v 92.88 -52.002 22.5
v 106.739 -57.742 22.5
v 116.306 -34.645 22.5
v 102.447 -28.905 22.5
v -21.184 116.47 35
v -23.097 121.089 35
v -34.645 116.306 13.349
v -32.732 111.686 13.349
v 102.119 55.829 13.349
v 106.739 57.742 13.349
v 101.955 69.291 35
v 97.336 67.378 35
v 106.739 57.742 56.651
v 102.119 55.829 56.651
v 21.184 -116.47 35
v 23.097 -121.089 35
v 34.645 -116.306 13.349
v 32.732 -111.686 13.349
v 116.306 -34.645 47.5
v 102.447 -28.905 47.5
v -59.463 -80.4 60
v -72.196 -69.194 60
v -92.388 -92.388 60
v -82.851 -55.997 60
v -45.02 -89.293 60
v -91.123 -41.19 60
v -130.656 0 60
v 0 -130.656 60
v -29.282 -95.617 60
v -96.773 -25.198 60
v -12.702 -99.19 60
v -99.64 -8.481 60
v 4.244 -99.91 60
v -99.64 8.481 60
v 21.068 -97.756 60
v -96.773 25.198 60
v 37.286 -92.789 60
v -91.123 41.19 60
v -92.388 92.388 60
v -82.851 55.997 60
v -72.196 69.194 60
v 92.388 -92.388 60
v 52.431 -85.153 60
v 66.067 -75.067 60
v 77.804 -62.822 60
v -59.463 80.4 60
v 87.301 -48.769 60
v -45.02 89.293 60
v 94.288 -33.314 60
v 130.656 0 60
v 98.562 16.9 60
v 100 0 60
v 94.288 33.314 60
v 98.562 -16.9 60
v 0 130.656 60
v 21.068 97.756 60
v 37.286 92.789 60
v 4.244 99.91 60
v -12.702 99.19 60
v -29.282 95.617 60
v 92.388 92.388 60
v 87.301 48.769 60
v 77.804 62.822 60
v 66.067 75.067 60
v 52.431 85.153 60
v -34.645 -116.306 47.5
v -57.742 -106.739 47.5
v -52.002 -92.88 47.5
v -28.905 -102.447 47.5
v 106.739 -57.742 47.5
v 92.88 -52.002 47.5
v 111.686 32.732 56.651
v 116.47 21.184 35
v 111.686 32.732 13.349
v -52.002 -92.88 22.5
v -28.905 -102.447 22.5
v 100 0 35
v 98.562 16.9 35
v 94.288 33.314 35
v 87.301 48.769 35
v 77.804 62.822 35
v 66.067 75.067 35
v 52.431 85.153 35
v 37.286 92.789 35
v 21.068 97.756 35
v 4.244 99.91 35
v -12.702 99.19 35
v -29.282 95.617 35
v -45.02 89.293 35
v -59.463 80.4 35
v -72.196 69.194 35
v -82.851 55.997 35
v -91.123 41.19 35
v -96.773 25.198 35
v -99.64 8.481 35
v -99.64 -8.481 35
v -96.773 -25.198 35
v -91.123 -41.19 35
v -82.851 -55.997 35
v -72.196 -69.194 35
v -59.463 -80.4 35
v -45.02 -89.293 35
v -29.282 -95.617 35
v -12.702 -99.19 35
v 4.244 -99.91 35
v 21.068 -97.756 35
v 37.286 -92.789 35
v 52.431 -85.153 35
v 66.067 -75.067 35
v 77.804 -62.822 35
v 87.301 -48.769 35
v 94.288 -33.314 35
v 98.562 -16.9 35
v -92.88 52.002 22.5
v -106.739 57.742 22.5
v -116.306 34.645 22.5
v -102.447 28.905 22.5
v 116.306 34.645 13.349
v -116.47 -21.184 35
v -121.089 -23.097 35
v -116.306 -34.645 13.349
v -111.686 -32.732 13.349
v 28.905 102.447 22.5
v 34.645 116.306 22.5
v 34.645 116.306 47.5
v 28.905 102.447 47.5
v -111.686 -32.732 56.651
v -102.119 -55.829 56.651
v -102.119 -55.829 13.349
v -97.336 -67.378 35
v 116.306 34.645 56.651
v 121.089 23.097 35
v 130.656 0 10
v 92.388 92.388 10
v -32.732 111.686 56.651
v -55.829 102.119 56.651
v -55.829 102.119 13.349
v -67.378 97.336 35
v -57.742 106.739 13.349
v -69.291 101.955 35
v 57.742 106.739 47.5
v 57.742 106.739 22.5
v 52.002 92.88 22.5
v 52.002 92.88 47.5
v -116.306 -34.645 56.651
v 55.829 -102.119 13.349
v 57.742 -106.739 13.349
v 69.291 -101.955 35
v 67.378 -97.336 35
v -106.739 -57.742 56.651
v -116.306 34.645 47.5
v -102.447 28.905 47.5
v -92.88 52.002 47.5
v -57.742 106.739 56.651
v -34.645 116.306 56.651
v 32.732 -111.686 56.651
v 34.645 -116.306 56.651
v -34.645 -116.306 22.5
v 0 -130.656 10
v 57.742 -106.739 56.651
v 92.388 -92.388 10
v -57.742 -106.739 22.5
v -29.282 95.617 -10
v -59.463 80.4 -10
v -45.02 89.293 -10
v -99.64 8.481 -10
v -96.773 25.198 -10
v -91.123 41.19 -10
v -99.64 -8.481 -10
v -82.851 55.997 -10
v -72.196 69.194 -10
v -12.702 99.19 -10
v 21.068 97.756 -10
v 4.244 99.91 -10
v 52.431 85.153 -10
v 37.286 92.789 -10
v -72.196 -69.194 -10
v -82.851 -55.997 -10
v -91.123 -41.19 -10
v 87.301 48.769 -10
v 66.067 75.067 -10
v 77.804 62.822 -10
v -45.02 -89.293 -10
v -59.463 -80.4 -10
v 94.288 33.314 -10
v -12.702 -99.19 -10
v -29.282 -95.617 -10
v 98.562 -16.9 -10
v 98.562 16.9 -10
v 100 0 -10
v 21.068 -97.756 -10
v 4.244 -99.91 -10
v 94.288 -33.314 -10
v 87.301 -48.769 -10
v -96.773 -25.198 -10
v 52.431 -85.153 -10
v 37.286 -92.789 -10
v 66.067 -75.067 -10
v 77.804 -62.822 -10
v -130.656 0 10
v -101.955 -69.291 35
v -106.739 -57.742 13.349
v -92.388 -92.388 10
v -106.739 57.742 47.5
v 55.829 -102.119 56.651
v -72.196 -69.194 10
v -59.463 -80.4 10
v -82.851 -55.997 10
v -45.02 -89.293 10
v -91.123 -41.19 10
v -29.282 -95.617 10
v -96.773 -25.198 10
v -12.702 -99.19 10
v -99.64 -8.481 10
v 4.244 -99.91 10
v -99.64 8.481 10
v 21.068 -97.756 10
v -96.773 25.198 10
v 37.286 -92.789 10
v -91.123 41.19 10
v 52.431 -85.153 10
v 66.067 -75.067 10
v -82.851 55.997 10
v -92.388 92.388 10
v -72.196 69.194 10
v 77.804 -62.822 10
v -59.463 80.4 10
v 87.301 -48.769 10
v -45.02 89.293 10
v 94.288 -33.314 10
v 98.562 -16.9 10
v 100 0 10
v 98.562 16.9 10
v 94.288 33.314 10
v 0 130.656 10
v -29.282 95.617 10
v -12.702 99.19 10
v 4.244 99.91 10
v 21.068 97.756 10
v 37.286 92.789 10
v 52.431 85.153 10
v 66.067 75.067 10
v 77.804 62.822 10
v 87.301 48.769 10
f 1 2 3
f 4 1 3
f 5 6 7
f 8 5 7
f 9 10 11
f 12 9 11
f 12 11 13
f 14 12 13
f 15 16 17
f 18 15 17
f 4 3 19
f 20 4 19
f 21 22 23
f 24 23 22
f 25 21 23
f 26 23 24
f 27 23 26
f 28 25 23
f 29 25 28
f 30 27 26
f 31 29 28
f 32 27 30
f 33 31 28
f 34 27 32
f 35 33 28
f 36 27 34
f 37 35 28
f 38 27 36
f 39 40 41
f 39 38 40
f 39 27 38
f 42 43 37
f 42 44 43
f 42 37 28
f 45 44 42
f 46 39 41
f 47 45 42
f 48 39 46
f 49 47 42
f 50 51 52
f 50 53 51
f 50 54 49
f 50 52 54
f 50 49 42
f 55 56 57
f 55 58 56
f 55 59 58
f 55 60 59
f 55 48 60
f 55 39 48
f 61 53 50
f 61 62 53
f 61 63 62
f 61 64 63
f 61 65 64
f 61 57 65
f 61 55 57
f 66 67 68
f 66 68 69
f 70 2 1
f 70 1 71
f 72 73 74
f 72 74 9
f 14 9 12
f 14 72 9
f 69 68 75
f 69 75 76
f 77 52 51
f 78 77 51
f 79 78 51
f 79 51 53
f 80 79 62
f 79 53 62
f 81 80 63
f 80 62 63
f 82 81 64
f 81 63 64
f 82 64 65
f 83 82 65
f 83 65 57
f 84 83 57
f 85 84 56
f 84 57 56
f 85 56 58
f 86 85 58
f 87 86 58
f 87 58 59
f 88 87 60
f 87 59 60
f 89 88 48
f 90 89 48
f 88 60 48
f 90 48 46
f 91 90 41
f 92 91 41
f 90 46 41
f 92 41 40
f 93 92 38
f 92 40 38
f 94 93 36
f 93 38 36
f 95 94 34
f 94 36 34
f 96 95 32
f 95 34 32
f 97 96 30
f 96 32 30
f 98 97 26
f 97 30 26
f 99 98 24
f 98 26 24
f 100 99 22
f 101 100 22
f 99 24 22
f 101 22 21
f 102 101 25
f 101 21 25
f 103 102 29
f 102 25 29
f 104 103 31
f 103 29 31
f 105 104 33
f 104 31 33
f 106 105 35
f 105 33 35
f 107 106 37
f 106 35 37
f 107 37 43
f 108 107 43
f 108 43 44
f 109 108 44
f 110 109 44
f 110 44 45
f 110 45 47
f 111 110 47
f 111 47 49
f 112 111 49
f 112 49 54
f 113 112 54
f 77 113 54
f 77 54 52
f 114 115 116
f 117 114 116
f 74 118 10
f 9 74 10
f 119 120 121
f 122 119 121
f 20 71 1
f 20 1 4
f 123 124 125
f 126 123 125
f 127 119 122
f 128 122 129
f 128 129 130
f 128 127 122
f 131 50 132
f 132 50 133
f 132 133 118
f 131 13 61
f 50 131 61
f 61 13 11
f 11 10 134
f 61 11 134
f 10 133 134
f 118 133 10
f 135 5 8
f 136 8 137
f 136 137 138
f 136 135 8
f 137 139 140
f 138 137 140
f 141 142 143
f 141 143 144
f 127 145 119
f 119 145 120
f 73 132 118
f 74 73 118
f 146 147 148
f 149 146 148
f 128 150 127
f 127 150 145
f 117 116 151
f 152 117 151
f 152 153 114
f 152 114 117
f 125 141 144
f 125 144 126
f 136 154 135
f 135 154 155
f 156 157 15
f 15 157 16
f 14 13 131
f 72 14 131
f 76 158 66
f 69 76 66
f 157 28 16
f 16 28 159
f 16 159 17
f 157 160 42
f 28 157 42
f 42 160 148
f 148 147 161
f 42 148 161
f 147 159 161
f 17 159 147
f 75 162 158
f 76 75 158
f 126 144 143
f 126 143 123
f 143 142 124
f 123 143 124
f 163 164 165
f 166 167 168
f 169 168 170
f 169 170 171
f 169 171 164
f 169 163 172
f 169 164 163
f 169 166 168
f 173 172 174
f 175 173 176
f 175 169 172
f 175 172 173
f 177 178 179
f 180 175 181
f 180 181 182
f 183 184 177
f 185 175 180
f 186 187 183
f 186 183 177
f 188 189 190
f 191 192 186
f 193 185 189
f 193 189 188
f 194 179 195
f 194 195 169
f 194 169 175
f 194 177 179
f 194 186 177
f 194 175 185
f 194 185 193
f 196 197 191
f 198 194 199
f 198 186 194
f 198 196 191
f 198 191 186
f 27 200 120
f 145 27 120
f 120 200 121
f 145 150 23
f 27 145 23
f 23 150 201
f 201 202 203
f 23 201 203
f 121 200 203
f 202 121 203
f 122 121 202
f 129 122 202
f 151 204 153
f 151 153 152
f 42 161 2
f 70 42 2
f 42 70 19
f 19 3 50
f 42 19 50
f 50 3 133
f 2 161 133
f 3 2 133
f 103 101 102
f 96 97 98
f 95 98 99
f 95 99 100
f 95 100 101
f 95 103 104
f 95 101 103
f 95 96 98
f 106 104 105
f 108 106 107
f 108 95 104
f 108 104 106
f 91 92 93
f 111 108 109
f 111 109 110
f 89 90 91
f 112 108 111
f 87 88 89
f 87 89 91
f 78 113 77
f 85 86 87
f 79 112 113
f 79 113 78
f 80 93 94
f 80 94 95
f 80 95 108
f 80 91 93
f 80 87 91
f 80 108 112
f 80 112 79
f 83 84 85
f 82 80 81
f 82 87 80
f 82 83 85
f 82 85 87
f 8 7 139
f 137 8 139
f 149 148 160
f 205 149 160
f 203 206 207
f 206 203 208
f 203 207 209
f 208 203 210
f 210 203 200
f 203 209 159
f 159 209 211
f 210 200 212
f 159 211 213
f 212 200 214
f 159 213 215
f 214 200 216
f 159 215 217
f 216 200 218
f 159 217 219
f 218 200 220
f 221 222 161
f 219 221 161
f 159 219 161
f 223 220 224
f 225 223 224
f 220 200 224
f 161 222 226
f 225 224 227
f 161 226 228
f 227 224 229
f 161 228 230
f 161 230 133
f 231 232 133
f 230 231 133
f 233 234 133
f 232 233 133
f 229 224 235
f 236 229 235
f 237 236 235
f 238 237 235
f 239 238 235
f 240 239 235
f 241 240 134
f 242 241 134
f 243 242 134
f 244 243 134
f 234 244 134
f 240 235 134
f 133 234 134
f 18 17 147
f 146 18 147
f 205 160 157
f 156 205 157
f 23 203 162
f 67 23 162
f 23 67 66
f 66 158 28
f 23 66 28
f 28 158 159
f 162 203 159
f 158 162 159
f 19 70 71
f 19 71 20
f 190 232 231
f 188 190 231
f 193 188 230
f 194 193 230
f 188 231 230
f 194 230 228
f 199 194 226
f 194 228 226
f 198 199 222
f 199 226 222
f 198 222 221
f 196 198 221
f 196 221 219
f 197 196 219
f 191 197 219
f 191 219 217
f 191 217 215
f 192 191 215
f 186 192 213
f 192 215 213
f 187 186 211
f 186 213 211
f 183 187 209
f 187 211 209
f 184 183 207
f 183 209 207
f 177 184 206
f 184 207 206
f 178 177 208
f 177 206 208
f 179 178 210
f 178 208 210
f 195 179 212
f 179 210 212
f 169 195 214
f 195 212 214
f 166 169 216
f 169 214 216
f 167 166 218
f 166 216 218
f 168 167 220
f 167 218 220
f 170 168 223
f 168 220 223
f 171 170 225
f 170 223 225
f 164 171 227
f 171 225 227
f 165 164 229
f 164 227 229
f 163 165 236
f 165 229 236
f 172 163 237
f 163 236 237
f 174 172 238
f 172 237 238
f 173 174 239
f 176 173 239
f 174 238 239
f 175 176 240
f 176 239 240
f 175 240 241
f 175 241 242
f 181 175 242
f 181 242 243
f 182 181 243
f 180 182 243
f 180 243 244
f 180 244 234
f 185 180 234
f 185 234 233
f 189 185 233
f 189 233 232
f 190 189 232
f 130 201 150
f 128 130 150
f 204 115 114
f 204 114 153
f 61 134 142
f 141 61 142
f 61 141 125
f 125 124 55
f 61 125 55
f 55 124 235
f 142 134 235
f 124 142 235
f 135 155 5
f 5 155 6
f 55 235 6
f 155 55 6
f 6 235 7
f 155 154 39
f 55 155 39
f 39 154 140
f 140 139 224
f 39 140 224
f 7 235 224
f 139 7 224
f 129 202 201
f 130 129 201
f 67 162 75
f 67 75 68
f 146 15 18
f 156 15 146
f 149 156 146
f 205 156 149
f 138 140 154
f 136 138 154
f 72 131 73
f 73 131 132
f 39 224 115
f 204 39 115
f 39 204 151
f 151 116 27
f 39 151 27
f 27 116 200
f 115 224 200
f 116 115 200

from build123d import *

# Parameters (mm, degrees)
F1_DEPTH  = 50
F2_W      = 25
F2_H      = 25
F3_DEPTH  = 15
F4_W      = 25
F4_H      = 25
F5_DEPTH  = 15
F6_W      = 25
F6_H      = 25
F7_DEPTH  = 15
F8_W      = 25
F8_H      = 25
F9_DEPTH  = 15
F11_DEPTH = 5
F13_DEPTH = 5
F15_DEPTH = 5
F17_DEPTH = 5
F18_R     = 100
F19_DEPTH = 25
F20_R     = 100
F21_DEPTH = 20


with BuildPart() as f1:
    # F0 (on Top) → F1 (new body)
    with BuildSketch(Plane.XY):
        Polygon((-92.3879532511, -92.3879532511), (0, -130.6562964876), (92.3879532511, -92.3879532511), (130.6562964876, 0), (92.3879532511, 92.3879532511), (0, 130.6562964876), (-92.3879532511, 92.3879532511), (-130.6562964876, 0), align=None)
    extrude(amount=F1_DEPTH)

    # F2 (on face) → F3 (cut)
    with BuildSketch(Plane(origin=(-46.1939766256, -111.5221248694, 0), x_dir=(0.9238795325, -0.3826834324, 0), z_dir=(-0.3826834324, -0.9238795325, 0))):
        with Locations((0, 25)):
            Rectangle(F2_W, F2_H)
    extrude(amount=-F3_DEPTH, mode=Mode.SUBTRACT)

    # F4 (on face) → F5 (cut)
    with BuildSketch(Plane(origin=(-111.5221248694, 46.1939766256, 0), x_dir=(-0.3826834324, -0.9238795325, 0), z_dir=(-0.9238795325, 0.3826834324, 0))):
        with Locations((0, 25)):
            Rectangle(F4_W, F4_H)
    extrude(amount=-F5_DEPTH, mode=Mode.SUBTRACT)

    # F6 (on face) → F7 (cut)
    with BuildSketch(Plane(origin=(46.1939766256, 111.5221248694, 0), x_dir=(-0.9238795325, 0.3826834324, 0), z_dir=(0.3826834324, 0.9238795325, 0))):
        with Locations((0, 25)):
            Rectangle(F6_W, F6_H)
    extrude(amount=-F7_DEPTH, mode=Mode.SUBTRACT)

    # F8 (on face) → F9 (cut)
    with BuildSketch(Plane(origin=(111.5221248694, -46.1939766256, 0), x_dir=(0.3826834324, 0.9238795325, 0), z_dir=(0.9238795325, -0.3826834324, 0))):
        with Locations((0, 25)):
            Rectangle(F8_W, F8_H)
    extrude(amount=-F9_DEPTH, mode=Mode.SUBTRACT)

    # F10 (on face) → F11 (cut)
    with BuildSketch(Plane(origin=(46.1939766256, -111.5221248694, 0), x_dir=(0.9238795325, 0.3826834324, 0), z_dir=(0.3826834324, -0.9238795325, 0))):
        Polygon((12.4999989995, 3.3493643278), (25, 24.9999988448), (12.5000010005, 46.650634517), (-12.4999989995, 46.6506356722), (-25, 25.0000011552), (-12.5000010005, 3.349365483), align=None)
    extrude(amount=-F11_DEPTH, mode=Mode.SUBTRACT)

    # F12 (on face) → F13 (cut)
    with BuildSketch(Plane(origin=(111.5221248694, 46.1939766256, 0), x_dir=(-0.3826834324, 0.9238795325, 0), z_dir=(0.9238795325, 0.3826834324, 0))):
        Polygon((12.4999987427, 3.3493641795), (25, 24.9999985481), (12.5000012573, 46.6506343687), (-12.4999987427, 46.6506358205), (-25, 25.0000014519), (-12.5000012573, 3.3493656313), align=None)
    extrude(amount=-F13_DEPTH, mode=Mode.SUBTRACT)

    # F14 (on face) → F15 (cut)
    with BuildSketch(Plane(origin=(-111.5221248694, -46.1939766256, 0), x_dir=(0.3826834324, -0.9238795325, 0), z_dir=(-0.9238795325, -0.3826834324, 0))):
        Polygon((12.5, 46.6506350946), (-12.5, 46.6506350946), (-25, 25), (-12.5, 3.3493649054), (12.5, 3.3493649054), (25, 25), align=None)
    extrude(amount=-F15_DEPTH, mode=Mode.SUBTRACT)

    # F16 (on face) → F17 (cut)
    with BuildSketch(Plane(origin=(-46.1939766256, 111.5221248694, 0), x_dir=(-0.9238795325, -0.3826834324, 0), z_dir=(-0.3826834324, 0.9238795325, 0))):
        Polygon((12.5, 46.6506350946), (-12.5, 46.6506350946), (-25, 25), (-12.5, 3.3493649054), (12.5, 3.3493649054), (25, 25), align=None)
    extrude(amount=-F17_DEPTH, mode=Mode.SUBTRACT)

    # F18 (on face) → F19 (cut)
    with BuildSketch(Plane.XY.offset(50)):
        Circle(F18_R)
    extrude(amount=-F19_DEPTH, mode=Mode.SUBTRACT)

    # F20 (on face) → F21 (join)
    with BuildSketch(Plane(origin=(0, 0, 0), x_dir=(1, 0, 0), z_dir=(0, 0, -1))):
        Circle(F20_R)
    extrude(amount=F21_DEPTH)


with BuildPart() as f1_1:
    # F22: moved
    add(f1.part.moved(Location((0, 0, 10))))


solid = f1_1.part
